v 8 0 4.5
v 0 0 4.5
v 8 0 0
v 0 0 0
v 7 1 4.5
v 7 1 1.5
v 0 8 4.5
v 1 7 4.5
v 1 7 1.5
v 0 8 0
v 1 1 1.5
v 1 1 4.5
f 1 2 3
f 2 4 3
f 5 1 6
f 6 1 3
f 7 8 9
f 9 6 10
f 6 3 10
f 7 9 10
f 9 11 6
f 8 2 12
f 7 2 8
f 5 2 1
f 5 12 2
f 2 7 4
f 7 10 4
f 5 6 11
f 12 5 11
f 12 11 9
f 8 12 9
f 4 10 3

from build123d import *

# Parameters (mm, degrees)
F1_DEPTH = 1.5
F3_DEPTH = 3


with BuildPart() as f1:
    # F0 (on Top) → F1 (new body)
    with BuildSketch(Plane.XY):
        Polygon((0, 8), (0, 0), (8, 0), align=None)
    extrude(amount=F1_DEPTH)

    # F2 (on face) → F3 (join)
    with BuildSketch(Plane.XY.offset(1.5)):
        Polygon((1, 1), (1, 7), (0, 8), (0, 0), (8, 0), (7, 1), align=None)
    extrude(amount=F3_DEPTH)


solid = f1.part
